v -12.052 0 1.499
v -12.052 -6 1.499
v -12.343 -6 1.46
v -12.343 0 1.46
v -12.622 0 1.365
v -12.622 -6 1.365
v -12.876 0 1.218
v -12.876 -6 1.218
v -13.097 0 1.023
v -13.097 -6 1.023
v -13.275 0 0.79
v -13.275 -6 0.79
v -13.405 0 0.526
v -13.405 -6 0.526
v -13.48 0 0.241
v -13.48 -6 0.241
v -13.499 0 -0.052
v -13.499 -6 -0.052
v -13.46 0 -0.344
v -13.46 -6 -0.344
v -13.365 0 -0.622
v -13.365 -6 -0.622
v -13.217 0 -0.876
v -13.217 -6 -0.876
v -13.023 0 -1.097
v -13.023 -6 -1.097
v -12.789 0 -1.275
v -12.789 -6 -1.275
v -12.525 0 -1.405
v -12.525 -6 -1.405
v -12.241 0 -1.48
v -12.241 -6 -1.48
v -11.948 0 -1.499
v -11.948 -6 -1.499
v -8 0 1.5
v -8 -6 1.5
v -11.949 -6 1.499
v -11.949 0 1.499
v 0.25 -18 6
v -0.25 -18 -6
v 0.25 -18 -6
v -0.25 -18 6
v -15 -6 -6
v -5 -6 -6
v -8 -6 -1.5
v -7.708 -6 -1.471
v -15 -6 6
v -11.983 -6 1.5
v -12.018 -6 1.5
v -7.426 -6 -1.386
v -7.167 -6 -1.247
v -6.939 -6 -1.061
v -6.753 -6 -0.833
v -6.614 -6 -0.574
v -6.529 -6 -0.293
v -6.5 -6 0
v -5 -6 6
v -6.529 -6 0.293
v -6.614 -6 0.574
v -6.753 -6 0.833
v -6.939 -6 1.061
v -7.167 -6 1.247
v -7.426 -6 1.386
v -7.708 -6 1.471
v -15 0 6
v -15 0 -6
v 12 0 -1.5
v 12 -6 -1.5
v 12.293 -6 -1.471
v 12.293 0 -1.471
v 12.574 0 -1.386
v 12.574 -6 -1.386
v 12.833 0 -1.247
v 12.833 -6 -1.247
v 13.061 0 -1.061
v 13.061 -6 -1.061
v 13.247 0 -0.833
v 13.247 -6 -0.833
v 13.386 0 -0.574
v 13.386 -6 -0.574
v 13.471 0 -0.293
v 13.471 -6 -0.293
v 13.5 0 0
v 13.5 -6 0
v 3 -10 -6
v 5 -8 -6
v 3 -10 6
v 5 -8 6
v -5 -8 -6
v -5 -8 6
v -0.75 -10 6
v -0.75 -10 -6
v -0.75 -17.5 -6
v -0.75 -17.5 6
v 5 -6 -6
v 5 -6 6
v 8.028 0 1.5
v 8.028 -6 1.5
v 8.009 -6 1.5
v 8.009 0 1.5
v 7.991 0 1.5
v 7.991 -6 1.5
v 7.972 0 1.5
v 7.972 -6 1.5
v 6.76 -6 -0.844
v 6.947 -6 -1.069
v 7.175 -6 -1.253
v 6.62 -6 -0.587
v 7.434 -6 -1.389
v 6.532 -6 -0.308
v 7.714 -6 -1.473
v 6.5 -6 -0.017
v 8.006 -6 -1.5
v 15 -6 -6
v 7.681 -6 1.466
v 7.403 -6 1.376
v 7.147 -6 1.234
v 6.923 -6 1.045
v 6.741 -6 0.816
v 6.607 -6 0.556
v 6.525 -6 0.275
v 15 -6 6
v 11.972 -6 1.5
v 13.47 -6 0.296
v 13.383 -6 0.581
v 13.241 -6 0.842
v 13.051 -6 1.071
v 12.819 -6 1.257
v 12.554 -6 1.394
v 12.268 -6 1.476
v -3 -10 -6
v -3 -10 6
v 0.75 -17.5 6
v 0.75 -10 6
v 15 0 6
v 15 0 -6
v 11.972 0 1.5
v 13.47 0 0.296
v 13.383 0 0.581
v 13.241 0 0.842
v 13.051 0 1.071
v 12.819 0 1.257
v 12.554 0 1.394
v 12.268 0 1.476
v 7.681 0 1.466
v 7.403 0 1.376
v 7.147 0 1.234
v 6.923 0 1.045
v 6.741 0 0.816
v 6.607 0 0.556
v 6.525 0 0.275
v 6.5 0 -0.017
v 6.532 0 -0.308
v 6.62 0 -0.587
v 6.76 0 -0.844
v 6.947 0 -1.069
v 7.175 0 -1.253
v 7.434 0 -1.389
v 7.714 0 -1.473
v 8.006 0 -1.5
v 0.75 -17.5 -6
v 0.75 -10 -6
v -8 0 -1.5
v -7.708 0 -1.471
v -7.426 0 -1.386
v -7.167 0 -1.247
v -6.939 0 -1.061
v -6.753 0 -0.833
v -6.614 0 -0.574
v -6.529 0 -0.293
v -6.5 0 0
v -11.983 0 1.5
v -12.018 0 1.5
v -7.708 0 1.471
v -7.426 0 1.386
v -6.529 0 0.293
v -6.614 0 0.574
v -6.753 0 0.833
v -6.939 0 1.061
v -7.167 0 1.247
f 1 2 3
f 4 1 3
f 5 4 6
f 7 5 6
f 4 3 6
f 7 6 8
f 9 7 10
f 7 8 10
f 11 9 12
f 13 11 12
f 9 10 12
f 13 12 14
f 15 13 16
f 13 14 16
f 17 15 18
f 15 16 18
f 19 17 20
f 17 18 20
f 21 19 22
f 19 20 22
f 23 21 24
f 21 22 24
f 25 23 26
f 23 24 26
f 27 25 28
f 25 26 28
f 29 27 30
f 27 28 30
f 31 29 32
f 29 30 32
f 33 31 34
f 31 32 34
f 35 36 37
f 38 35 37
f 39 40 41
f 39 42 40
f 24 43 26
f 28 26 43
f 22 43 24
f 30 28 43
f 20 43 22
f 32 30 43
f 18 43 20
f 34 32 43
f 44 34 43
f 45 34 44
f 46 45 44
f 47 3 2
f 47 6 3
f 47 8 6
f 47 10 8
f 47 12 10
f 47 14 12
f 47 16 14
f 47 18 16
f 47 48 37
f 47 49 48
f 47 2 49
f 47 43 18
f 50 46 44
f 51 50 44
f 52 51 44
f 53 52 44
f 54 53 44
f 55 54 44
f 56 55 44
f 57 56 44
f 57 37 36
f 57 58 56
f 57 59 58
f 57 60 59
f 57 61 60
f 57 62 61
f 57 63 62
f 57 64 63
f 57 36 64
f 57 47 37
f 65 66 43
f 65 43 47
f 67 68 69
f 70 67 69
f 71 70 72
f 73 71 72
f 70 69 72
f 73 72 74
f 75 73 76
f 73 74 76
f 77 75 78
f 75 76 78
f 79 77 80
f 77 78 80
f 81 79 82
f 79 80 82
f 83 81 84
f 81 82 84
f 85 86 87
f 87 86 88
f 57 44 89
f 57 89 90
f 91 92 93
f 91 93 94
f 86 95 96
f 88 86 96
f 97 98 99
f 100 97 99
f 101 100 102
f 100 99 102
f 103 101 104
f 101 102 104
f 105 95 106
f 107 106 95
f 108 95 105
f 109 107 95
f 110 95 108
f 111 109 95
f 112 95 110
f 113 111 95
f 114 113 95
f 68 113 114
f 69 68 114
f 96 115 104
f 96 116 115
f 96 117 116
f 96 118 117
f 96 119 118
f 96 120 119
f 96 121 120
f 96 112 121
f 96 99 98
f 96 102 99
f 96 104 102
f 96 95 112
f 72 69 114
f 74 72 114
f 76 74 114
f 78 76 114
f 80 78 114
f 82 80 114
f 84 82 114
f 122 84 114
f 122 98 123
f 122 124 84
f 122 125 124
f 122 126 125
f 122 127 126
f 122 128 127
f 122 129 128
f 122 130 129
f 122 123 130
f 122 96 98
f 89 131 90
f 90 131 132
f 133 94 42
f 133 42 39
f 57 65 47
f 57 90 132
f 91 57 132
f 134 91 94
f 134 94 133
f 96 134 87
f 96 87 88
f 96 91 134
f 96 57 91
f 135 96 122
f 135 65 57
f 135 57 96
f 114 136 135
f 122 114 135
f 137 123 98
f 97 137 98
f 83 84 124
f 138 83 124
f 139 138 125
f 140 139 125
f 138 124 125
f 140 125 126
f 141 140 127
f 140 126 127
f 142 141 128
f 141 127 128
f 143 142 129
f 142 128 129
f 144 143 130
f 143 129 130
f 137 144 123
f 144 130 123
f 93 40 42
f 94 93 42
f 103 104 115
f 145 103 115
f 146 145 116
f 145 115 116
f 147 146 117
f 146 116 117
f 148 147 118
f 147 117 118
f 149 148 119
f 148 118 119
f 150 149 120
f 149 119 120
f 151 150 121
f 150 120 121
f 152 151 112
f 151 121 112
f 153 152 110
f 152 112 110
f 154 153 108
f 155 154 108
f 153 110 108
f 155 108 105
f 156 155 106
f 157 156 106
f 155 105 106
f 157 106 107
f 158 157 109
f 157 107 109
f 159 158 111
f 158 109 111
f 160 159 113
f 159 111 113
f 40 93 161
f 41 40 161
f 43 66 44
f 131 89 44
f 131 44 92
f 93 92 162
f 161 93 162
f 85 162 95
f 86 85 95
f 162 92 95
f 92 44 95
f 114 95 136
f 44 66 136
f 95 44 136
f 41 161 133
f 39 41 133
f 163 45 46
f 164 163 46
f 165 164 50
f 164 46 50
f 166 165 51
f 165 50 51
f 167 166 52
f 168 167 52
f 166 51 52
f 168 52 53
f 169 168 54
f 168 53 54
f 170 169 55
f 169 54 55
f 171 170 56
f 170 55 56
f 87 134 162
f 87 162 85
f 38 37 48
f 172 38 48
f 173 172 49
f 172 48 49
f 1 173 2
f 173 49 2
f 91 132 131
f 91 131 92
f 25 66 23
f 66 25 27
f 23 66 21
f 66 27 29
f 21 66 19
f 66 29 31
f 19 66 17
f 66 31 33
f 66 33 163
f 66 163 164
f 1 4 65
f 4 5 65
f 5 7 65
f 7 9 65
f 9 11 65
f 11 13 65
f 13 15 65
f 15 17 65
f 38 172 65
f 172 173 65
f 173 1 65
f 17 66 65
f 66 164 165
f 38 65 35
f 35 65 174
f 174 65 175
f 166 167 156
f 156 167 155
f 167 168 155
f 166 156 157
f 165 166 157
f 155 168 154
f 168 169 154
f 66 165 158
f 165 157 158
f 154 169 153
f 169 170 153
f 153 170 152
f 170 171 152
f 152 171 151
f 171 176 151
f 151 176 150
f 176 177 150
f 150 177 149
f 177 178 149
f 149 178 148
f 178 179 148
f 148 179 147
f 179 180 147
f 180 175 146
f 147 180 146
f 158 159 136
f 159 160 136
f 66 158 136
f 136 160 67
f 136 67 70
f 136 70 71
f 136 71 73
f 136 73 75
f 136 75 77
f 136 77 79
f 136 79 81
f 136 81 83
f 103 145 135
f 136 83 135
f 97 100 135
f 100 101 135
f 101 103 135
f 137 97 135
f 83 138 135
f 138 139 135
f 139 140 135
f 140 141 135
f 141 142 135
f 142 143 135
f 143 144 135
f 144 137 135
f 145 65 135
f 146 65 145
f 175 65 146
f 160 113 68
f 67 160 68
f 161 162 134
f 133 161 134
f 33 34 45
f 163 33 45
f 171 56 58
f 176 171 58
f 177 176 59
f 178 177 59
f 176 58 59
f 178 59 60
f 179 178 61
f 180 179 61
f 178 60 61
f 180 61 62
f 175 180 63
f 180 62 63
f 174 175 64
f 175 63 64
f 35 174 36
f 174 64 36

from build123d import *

# Parameters (mm, degrees)
F0_W      = 30
F0_H      = 12
F1_DEPTH  = 6
F2_W      = 10
F2_H      = 12
F3_DEPTH  = 4
F4_W      = 1.5
F4_H      = 12
F5_DEPTH  = 8
F6_SIZE   = 2
F7_SIZE   = 0.5
F10_DEPTH = 6
F12_DEPTH = 6


with BuildPart() as f1:
    # F0 (on Front) → F1 (new body)
    with BuildSketch(Plane.XZ):
        Rectangle(F0_W, F0_H)
    extrude(amount=F1_DEPTH)

    # F2 (on face) → F3 (join)
    with BuildSketch(Plane.XZ.offset(6)):
        Rectangle(F2_W, F2_H)
    extrude(amount=F3_DEPTH)

    # F4 (on face) → F5 (join)
    with BuildSketch(Plane.XZ.offset(10)):
        Rectangle(F4_W, F4_H)
    extrude(amount=F5_DEPTH)

    # F6
    f6_edges = [f1.edges().sort_by_distance(p)[0] for p in [
        (-5, -10, 0),
        (5, -10, 0),
    ]]
    chamfer(f6_edges, length=F6_SIZE)

    # F7
    f7_edges = [f1.edges().sort_by_distance(p)[0] for p in [
        (-0.75, -18, 0),
        (0.75, -18, 0),
    ]]
    chamfer(f7_edges, length=F7_SIZE)

    # F9 (on face) → F10 (cut, through all)
    with BuildSketch(Plane.XZ.offset(6)):
        with BuildLine():
            Line((8.028282, 1.499733), (7.971718, 1.499733))
            ThreePointArc((7.971718, 1.499733), (6.500096, -0.016942), (8.005601, -1.49999))
            ThreePointArc((8.005601, -1.49999), (9.062639, -1.058678), (9.5, 0))
            ThreePointArc((9.5, 0), (9.070613, 1.050614), (8.028282, 1.499733))
        make_face()
        with BuildLine():
            ThreePointArc((8.028282, 1.499733), (8, 1.5), (7.971718, 1.499733))
            Line((7.971718, 1.499733), (8.028282, 1.499733))
        make_face()
        with BuildLine():
            ThreePointArc((9.5, 0), (9.062639, -1.058678), (8.005601, -1.49999))
            Line((8.005601, -1.49999), (11.999996, -1.5))
            ThreePointArc((11.999996, -1.5), (10.500067, -0.014139), (11.971718, 1.499733))
            Line((11.971718, 1.499733), (8.028282, 1.499733))
            ThreePointArc((8.028282, 1.499733), (9.070613, 1.050614), (9.5, 0))
        make_face()
        with BuildLine():
            ThreePointArc((11.971718, 1.499733), (10.500067, -0.014139), (11.999996, -1.5))
            ThreePointArc((11.999996, -1.5), (13.060659, -1.060662), (13.5, 0))
            ThreePointArc((13.5, 0), (13.050614, 1.070613), (11.971718, 1.499733))
        make_face()
    extrude(amount=-F10_DEPTH, mode=Mode.SUBTRACT)

    # F11 (on face) → F12 (cut, through all)
    with BuildSketch(Plane.XZ.offset(6)):
        with BuildLine():
            Line((-11.948695, 1.499122), (-12.051971, 1.499099))
            ThreePointArc((-12.051971, 1.499099), (-13.499095, -0.052084), (-11.947804, -1.499092))
            ThreePointArc((-11.947804, -1.499092), (-10.921043, -1.042043), (-10.5, 0))
            ThreePointArc((-10.5, 0), (-10.921353, 1.042363), (-11.948695, 1.499122))
        make_face()
        with BuildLine():
            ThreePointArc((-11.948695, 1.499122), (-12.000333, 1.5), (-12.051971, 1.499099))
            Line((-12.051971, 1.499099), (-11.948695, 1.499122))
        make_face()
        with BuildLine():
            ThreePointArc((-10.5, 0), (-10.921043, -1.042043), (-11.947804, -1.499092))
            Line((-11.947804, -1.499092), (-8.000345, -1.5))
            ThreePointArc((-8.000345, -1.5), (-9.5, 6e-06), (-8.000333, 1.5))
            Line((-8.000333, 1.5), (-11.948695, 1.499122))
            ThreePointArc((-11.948695, 1.499122), (-10.921353, 1.042363), (-10.5, 0))
        make_face()
        with BuildLine():
            ThreePointArc((-8.000333, 1.5), (-9.5, 6e-06), (-8.000345, -1.5))
            ThreePointArc((-8.000345, -1.5), (-6.939462, -1.060782), (-6.5, 0))
            ThreePointArc((-6.5, 0), (-6.939458, 1.060778), (-8.000333, 1.5))
        make_face()
    extrude(amount=-F12_DEPTH, mode=Mode.SUBTRACT)


solid = f1.part
